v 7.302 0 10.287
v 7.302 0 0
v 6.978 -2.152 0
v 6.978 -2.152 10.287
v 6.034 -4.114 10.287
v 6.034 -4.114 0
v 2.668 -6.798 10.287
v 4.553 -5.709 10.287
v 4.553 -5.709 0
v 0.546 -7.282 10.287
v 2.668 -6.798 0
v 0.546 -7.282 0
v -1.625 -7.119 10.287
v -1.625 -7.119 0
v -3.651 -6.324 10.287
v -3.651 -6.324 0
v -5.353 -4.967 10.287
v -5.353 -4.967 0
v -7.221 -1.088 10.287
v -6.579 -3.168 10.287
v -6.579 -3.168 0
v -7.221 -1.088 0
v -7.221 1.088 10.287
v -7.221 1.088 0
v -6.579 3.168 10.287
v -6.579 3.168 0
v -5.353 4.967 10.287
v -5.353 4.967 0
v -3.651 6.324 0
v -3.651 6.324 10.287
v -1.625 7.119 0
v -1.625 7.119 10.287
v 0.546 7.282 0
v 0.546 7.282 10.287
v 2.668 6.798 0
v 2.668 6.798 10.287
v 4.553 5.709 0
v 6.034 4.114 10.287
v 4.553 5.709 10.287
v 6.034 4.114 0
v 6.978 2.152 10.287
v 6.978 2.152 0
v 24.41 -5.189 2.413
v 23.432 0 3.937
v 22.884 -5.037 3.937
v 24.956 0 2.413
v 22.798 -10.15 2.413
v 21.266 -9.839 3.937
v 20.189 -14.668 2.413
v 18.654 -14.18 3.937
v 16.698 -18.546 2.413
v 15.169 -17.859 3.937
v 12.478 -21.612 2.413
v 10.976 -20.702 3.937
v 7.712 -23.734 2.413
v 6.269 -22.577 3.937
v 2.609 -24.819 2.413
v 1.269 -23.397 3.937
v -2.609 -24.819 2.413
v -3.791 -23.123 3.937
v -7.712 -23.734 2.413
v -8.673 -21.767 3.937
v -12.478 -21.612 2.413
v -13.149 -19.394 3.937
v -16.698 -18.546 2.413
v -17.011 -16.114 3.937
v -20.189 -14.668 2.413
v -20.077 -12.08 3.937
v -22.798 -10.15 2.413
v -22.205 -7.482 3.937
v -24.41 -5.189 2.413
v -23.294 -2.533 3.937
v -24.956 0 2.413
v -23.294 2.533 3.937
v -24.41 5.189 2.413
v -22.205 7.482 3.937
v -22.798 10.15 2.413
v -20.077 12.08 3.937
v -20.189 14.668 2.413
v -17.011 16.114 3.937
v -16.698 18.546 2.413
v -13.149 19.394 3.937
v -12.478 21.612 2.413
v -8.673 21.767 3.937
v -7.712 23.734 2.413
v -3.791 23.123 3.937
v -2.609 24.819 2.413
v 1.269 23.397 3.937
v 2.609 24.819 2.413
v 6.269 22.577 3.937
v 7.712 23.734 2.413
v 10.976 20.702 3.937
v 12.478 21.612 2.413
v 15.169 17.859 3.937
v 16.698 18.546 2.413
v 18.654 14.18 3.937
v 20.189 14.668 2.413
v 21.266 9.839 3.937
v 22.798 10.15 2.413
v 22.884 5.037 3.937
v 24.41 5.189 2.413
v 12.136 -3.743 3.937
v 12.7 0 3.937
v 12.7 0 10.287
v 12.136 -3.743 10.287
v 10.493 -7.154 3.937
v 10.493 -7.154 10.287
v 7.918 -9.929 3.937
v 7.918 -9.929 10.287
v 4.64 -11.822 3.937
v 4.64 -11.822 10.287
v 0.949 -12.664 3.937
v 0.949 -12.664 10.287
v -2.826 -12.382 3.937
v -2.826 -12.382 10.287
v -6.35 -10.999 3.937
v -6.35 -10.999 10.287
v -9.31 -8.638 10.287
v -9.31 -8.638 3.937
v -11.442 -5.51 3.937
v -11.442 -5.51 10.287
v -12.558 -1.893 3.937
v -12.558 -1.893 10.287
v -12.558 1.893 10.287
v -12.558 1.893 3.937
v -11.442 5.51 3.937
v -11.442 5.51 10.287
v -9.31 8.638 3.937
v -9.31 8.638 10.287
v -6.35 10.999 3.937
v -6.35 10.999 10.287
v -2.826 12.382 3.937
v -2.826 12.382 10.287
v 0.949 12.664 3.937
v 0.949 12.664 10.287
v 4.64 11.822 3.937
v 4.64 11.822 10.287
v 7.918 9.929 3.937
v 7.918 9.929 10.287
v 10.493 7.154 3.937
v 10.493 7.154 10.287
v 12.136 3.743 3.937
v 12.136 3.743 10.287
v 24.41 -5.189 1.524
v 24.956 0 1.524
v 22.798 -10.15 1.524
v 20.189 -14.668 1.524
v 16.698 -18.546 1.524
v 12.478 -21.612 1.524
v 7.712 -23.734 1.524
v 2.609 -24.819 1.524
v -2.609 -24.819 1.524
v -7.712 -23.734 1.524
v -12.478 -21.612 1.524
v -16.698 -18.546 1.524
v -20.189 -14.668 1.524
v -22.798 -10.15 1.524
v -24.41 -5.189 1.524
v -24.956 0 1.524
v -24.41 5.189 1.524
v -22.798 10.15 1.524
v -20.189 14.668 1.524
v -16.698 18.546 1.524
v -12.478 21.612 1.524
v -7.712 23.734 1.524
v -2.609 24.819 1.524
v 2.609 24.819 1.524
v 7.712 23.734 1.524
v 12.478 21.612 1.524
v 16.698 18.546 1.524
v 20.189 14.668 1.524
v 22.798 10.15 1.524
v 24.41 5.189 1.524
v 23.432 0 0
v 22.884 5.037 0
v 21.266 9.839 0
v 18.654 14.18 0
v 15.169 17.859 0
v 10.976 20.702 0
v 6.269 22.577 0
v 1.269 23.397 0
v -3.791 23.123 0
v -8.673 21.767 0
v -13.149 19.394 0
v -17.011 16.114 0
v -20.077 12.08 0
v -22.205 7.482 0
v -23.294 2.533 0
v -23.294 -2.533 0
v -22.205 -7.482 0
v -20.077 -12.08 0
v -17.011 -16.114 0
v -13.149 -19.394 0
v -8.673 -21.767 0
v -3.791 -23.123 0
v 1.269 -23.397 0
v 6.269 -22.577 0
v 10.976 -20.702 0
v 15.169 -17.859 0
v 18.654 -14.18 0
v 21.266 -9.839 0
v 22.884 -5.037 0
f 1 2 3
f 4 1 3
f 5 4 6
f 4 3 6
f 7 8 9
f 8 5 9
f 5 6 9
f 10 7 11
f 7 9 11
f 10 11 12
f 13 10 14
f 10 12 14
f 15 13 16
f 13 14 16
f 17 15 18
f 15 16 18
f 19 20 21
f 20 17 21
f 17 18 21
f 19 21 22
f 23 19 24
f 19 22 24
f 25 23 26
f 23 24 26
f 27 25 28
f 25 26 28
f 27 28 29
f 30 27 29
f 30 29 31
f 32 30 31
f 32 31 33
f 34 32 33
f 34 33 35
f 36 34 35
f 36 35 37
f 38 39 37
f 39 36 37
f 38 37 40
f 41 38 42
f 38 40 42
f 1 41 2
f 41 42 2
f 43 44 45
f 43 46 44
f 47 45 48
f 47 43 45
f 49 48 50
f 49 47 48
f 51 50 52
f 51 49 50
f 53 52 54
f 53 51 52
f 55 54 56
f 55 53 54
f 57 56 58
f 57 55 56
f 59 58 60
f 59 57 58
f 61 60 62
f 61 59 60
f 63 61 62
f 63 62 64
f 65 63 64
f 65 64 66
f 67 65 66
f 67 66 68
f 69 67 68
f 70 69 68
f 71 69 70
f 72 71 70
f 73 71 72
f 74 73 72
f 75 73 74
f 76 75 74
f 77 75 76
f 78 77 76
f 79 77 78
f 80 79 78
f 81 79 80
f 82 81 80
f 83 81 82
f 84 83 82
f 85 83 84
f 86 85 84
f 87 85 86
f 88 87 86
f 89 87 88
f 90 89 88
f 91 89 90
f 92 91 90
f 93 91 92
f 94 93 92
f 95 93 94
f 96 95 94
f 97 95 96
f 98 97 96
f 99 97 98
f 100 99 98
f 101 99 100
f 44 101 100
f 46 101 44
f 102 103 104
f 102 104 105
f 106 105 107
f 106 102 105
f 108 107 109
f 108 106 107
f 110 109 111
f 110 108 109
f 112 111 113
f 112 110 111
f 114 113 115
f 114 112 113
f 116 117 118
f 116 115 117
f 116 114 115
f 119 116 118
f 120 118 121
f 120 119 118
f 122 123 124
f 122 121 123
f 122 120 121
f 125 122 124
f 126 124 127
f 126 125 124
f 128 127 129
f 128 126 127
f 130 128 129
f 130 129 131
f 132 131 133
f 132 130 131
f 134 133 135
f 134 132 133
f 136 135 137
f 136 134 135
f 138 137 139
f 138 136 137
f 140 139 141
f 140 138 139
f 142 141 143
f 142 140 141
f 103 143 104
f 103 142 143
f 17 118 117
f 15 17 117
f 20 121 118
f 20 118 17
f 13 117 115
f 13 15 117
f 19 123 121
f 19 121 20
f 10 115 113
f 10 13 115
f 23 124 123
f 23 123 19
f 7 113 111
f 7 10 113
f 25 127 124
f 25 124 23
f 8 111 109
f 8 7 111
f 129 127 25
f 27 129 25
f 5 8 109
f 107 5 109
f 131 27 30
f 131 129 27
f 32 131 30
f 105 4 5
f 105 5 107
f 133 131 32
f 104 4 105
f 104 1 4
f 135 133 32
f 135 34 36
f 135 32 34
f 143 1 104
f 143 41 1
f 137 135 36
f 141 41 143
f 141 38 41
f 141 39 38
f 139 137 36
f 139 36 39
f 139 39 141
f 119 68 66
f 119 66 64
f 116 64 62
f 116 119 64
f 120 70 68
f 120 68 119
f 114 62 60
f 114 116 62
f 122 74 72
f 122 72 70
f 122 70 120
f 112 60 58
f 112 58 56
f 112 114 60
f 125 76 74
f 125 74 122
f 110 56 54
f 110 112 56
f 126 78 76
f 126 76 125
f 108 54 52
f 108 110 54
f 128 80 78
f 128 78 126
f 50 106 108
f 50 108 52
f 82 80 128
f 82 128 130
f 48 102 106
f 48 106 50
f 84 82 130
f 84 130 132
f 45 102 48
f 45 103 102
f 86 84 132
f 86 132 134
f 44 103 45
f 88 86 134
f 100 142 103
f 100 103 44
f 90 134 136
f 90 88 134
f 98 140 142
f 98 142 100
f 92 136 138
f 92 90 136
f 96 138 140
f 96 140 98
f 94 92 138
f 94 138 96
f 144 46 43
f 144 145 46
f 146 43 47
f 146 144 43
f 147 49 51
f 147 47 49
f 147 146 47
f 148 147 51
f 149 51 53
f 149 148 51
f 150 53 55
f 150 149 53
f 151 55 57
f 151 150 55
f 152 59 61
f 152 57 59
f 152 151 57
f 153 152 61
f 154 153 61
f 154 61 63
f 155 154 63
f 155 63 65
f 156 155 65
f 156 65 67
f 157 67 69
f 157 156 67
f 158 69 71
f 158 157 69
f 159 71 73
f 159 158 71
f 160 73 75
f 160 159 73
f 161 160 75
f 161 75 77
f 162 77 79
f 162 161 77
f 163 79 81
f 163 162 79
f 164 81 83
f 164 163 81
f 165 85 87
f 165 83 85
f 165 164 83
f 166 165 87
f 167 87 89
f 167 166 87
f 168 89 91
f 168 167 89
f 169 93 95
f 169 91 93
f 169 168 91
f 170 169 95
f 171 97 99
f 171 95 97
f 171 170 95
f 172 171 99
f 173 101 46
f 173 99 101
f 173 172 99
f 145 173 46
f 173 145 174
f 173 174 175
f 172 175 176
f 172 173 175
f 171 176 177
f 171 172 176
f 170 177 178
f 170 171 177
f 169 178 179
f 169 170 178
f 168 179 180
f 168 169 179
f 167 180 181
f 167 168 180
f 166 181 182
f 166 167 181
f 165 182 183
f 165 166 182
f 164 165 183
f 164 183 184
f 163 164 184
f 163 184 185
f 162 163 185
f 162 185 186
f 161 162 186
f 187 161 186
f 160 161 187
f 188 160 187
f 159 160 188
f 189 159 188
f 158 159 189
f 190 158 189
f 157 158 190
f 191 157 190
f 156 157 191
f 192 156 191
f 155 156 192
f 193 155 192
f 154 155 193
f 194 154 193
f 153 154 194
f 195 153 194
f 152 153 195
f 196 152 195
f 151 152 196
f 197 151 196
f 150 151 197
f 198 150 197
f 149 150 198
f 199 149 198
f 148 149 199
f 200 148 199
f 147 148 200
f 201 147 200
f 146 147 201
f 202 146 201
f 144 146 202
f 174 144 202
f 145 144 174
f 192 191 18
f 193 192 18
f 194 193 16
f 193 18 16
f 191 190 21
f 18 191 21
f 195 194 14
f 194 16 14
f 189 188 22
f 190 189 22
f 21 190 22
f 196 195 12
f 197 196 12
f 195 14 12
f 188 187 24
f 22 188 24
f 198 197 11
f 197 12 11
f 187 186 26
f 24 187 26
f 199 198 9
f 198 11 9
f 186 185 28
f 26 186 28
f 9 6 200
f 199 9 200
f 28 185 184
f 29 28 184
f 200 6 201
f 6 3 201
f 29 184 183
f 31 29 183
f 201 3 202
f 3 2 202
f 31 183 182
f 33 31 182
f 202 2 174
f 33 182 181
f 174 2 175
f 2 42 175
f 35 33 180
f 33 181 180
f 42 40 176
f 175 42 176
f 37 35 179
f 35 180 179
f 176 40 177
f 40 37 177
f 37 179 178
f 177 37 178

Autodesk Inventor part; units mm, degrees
ref_plane "YZ Plane" through (0, 0, 0) normal (1, 0, 0) x (0, 1, 0)
ref_plane "XZ Plane" through (0, 0, 0) normal (0, 1, 0) x (-1, 0, 0)
ref_plane "XY Plane" through (0, 0, 0) normal (0, 0, 1) x (1, 0, 0)
sketch "Sketch1" plane through (0, 0, 0) normal (0, 0, 1) x (1, 0, 0)
  circle A0 centre (0, 0) radius 24.9555
  circle A1 centre (0, 0) radius 7.3025
  dimension "d0" = 49.911
  dimension "d2" = 14.605
extrude "Extrusion1" add sketch "Sketch1" along normal blind 3.937
sketch "Sketch2" plane through (0, 0, 3.937) normal (0, 0, 1) x (1, 0, 0)
  circle A0 centre (0, 0) radius 7.3025
  circle A1 centre (0, 0) radius 12.7
  dimension "d5" = 25.4
extrude "Extrusion2" add sketch "Sketch2" along normal blind 6.35
chamfer "Chamfer1" distance 1.524 angle 45 1 edges at (-24.9555, 0, 3.937)
chamfer "Chamfer2" distance 1.524 angle 45 1 edges at (-24.9555, 0, 0)
properties part number "Sprocket Large"
